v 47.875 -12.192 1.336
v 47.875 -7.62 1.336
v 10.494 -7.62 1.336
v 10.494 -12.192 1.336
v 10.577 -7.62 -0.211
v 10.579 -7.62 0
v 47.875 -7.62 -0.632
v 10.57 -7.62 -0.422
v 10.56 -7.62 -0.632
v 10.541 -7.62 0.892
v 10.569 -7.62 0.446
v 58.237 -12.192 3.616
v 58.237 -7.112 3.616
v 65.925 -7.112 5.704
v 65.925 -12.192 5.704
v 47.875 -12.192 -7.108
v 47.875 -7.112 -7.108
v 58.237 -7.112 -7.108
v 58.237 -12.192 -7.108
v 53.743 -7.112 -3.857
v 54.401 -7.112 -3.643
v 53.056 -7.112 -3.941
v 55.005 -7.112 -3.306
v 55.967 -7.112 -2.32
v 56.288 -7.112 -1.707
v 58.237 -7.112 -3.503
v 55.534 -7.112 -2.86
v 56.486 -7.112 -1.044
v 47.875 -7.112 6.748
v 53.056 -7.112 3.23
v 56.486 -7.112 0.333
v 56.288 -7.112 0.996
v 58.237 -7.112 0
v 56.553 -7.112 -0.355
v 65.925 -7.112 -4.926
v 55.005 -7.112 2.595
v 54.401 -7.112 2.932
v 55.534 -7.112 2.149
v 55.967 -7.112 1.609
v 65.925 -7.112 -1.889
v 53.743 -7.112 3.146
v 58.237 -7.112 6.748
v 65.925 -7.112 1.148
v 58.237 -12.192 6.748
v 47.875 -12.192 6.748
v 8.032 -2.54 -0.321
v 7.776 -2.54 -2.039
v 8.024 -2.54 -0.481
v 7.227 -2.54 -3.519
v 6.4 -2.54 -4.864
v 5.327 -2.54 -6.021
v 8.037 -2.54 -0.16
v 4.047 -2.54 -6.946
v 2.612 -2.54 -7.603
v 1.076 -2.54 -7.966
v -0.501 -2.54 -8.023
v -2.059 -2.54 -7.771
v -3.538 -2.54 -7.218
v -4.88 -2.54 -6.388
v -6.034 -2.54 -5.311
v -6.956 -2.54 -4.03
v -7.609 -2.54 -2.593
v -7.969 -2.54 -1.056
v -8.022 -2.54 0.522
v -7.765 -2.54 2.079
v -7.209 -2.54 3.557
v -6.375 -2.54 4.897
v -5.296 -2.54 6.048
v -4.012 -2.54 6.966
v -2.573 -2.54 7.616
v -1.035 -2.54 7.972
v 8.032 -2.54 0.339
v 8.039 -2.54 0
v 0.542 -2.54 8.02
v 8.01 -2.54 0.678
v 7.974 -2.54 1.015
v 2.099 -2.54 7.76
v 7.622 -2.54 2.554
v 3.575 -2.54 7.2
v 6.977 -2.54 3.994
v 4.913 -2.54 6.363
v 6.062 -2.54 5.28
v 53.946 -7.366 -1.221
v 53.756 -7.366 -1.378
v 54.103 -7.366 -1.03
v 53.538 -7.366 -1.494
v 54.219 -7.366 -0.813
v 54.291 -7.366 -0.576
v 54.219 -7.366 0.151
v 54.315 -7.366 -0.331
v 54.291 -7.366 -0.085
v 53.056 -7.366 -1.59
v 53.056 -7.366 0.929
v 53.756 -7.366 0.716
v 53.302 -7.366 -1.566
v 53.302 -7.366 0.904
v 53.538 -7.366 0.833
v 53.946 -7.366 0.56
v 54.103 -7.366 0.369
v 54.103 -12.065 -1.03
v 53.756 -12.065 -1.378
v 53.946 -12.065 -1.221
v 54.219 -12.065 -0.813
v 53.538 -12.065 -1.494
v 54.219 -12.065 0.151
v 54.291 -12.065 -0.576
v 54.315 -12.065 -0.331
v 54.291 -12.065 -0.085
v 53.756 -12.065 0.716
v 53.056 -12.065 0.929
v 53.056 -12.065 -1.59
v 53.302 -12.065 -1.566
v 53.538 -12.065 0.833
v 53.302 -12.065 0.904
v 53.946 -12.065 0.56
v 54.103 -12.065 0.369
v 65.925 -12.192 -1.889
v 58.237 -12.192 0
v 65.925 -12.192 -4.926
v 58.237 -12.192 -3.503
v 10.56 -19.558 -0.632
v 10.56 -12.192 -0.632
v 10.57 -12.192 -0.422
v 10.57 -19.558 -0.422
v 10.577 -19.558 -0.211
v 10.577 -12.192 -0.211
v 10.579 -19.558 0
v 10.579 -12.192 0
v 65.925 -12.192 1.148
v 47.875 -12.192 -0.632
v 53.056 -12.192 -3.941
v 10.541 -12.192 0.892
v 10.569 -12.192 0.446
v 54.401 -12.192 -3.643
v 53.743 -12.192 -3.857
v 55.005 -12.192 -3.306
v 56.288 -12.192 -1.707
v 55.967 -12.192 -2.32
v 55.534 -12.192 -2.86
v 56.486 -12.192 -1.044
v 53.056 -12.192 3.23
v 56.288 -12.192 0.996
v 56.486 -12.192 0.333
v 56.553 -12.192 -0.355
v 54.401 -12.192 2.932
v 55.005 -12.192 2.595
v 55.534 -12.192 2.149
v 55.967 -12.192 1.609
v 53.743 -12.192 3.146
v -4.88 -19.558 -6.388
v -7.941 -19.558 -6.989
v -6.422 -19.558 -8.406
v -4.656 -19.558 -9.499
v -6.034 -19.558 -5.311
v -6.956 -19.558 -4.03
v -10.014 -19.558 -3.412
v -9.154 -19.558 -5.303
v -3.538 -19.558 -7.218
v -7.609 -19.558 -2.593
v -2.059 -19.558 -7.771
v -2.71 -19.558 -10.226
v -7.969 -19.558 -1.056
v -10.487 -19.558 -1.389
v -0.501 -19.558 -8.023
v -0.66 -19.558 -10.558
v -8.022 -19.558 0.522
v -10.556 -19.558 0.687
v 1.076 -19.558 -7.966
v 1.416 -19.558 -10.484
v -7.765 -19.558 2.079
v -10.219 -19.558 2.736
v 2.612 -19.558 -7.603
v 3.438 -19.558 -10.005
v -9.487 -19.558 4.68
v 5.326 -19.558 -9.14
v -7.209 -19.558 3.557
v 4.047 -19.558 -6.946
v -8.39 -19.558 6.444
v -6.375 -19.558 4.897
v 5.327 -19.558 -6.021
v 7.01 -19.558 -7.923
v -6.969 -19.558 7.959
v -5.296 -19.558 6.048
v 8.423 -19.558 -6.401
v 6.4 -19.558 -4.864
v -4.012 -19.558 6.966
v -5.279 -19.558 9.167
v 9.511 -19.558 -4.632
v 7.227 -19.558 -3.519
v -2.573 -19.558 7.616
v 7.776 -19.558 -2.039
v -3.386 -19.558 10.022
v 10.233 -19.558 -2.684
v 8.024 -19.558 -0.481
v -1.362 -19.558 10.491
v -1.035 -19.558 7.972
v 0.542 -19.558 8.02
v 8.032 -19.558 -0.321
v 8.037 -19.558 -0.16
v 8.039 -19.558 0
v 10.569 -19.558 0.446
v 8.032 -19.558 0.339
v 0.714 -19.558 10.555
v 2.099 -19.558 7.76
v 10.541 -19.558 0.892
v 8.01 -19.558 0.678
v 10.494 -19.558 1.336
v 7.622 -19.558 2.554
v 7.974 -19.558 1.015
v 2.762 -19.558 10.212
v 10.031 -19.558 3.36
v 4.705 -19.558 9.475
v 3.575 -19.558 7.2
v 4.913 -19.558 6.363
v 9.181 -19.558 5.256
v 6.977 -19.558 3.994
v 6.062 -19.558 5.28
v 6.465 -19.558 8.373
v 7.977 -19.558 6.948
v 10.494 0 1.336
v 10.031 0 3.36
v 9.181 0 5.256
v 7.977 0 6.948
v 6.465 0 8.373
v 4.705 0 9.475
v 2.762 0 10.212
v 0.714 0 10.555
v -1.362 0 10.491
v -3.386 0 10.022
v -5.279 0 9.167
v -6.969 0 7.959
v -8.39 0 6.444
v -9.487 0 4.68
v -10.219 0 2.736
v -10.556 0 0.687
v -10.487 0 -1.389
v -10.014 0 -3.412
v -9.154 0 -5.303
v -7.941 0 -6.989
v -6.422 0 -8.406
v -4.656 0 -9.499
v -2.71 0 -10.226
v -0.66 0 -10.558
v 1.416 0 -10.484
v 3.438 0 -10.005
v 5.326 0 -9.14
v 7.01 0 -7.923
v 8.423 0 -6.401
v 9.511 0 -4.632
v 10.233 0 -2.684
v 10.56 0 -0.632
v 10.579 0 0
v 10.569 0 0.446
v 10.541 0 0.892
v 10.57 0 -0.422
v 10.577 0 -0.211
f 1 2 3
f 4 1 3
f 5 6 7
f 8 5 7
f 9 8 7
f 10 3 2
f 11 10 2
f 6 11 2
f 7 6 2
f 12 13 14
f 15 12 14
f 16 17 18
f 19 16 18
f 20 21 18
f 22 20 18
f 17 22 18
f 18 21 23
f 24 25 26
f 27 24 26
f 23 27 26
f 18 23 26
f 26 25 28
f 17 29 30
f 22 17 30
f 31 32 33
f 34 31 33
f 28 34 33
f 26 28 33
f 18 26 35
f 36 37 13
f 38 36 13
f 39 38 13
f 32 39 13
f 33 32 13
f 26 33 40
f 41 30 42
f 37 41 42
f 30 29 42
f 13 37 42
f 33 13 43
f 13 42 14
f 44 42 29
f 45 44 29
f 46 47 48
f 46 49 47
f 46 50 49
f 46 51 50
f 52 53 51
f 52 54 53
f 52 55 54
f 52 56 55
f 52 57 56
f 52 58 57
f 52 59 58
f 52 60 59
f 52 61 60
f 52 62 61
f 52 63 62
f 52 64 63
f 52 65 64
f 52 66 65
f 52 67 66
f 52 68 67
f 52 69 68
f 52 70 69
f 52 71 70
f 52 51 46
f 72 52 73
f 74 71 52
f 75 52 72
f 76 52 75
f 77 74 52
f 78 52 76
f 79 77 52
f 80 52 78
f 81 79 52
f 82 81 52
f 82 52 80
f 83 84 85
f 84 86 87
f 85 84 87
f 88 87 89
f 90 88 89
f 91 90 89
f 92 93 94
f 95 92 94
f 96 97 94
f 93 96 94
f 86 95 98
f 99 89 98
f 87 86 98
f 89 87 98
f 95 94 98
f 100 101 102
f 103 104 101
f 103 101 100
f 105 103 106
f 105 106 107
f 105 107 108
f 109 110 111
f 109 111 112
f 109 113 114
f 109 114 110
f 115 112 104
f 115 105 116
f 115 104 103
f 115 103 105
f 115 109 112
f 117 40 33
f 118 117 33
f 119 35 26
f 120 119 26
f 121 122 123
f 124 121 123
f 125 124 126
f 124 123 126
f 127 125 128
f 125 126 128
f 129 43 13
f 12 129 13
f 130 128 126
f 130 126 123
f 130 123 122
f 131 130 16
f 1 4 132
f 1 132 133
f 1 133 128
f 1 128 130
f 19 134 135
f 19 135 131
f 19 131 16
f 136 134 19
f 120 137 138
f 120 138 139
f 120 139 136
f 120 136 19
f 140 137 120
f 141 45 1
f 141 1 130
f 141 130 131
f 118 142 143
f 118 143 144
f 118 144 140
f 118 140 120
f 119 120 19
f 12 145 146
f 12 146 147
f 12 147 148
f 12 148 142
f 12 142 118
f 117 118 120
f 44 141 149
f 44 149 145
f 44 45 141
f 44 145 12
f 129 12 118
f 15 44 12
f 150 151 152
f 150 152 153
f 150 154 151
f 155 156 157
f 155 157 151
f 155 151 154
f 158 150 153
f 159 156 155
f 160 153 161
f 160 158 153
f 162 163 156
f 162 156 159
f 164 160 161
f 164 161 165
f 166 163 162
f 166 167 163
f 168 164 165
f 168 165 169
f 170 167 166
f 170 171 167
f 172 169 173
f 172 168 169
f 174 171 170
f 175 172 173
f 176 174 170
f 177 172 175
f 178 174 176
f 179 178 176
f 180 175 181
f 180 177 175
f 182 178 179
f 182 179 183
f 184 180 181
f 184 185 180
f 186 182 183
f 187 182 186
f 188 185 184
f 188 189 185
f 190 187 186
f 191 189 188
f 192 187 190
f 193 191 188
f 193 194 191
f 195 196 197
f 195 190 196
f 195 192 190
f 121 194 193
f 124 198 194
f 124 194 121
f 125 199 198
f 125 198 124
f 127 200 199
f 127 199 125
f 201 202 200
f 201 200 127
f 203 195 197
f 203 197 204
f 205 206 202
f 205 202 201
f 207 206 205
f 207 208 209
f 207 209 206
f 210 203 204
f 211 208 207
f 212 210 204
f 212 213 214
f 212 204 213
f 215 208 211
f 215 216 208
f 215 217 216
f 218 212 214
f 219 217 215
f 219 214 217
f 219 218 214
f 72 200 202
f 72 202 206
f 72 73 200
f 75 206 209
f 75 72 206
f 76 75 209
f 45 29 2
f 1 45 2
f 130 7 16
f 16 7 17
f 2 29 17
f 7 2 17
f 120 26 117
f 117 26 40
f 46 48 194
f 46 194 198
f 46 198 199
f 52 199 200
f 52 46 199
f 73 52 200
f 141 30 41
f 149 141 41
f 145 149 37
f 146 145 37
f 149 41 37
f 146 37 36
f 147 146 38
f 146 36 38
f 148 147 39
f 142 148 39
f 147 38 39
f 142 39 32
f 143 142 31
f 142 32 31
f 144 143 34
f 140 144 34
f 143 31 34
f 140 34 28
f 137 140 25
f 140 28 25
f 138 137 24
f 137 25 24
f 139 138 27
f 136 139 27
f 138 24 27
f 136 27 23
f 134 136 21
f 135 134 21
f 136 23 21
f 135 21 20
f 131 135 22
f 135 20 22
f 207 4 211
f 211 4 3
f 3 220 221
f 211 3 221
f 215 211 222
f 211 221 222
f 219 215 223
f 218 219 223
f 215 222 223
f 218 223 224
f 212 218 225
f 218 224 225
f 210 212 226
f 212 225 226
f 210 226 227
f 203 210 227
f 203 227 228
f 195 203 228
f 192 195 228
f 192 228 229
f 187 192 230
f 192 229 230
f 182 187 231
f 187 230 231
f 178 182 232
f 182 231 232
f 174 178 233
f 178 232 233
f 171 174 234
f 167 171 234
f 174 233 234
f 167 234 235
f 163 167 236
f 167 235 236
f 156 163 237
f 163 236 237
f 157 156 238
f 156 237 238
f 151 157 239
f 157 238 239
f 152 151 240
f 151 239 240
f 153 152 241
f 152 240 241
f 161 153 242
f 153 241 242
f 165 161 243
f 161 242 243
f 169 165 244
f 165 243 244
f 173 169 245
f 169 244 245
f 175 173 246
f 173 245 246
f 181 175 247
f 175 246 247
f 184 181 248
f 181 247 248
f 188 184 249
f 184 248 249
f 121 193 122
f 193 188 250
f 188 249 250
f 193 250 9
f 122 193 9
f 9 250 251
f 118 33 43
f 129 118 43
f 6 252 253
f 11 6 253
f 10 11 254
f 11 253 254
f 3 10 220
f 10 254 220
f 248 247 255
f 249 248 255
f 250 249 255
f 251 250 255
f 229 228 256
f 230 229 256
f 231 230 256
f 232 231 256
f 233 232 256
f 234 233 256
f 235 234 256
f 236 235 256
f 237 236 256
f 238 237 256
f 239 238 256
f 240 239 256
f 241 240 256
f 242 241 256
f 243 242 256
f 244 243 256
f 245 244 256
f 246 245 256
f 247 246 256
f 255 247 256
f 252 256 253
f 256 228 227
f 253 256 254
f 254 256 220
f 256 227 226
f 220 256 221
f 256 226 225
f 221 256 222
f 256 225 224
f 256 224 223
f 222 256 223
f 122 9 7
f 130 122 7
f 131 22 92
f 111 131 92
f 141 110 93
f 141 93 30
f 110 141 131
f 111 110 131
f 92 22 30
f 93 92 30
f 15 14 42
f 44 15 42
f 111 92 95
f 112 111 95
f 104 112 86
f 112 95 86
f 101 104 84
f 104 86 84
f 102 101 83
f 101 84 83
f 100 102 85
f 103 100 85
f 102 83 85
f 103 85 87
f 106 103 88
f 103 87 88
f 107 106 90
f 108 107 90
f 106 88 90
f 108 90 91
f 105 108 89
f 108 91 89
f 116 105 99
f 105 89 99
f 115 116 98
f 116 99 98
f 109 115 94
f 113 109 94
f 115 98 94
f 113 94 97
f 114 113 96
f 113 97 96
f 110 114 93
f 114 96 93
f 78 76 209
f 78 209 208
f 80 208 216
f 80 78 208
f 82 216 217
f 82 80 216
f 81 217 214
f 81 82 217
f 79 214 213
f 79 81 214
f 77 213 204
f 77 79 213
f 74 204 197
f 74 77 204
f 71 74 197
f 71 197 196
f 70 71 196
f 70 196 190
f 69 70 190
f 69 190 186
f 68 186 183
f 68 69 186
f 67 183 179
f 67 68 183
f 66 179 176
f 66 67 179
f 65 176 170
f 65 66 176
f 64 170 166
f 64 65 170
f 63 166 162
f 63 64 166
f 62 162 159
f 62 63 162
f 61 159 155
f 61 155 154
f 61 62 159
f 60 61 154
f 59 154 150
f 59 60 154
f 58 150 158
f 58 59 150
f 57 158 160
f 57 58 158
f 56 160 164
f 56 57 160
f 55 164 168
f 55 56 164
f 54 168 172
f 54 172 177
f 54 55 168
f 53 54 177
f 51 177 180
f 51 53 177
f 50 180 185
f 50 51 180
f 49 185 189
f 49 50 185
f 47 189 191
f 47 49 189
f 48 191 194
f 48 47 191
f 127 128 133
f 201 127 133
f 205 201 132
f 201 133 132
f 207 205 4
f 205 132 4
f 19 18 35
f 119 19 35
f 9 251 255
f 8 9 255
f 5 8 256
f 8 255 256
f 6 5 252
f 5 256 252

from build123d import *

# Parameters (mm, degrees)
F1_DEPTH = 19.558
F2_T     = -2.54
F3_START = 7.62
F3_DEPTH = 4.572
F4_START = 7.112
F4_DEPTH = 5.08
F5_START = 7.366
F5_DEPTH = 4.699


with BuildPart() as f1:
    # F0 (on Front) → F1 (new body)
    with BuildSketch(Plane.XZ):
        with BuildLine():
            Line((10.5598789448, -0.6324698916), (10.4941550919, 1.3355786754))
            ThreePointArc((10.4941550919, 1.3355786754), (-10.5729083556, -0.3530869534), (10.5598789448, -0.6324698916))
        make_face()
        with BuildLine():
            ThreePointArc((10.5598789448, -0.6324698916), (10.574070523, -0.3163764621), (10.5788024602, 0))
            ThreePointArc((10.5788024602, 0), (10.5576194096, 0.6691292056), (10.4941550919, 1.3355786754))
            Line((10.4941550919, 1.3355786754), (10.5598789448, -0.6324698916))
        make_face()
    extrude(amount=F1_DEPTH)

    # F2
    f2_openings = [f1.faces().sort_by_distance(p)[0] for p in [
        (0, -19.558, 0),
    ]]
    offset(amount=F2_T, openings=f2_openings)

    # F0 (on Front) → F3 (join)
    with BuildSketch(Plane.XZ.offset(F3_START)):
        with BuildLine():
            ThreePointArc((10.4941550919, 1.3355786754), (10.5576194096, 0.6691292056), (10.5788024602, 0))
            ThreePointArc((10.5788024602, 0), (10.574070523, -0.3163764621), (10.5598789448, -0.6324698916))
            Line((10.5598789448, -0.6324698916), (47.8745400906, -0.6324698916))
            Line((47.8745400906, -0.6324698916), (47.8745400906, 1.3355786754))
            Line((47.8745400906, 1.3355786754), (10.4941550919, 1.3355786754))
        make_face()
    extrude(amount=F3_DEPTH)

    # F0 (on Front) → F4 (join)
    with BuildSketch(Plane.XZ.offset(F4_START)):
        Polygon((47.8745400906, 6.7476513796), (47.8745400906, 1.3355786754), (47.8745400906, -0.6324698916), (47.8745400906, -7.1075903252), (58.2372918725, -7.1075903252), (65.9249648452, -4.9262144603), (58.2372918725, -3.502572421), (65.9249648452, -1.8891115906), (58.2372918725, 0), (65.9249648452, 1.1479911627), (58.2372918725, 3.6156391725), (65.9249648452, 5.7036471553), (58.2372918725, 6.7476513796), align=None)
        with BuildLine():
            ThreePointArc((53.0559159815, 3.2301100822), (56.5529149026, -0.3554173745), (53.0559159815, -3.9409448312))
            Line((53.0559159815, -3.9409448312), (53.0559159815, -1.589890453))
            Line((53.0559159815, -1.589890453), (53.0559159815, 0.9286483983))
            Line((53.0559159815, 0.9286483983), (53.0559159815, 3.2301100822))
        make_face(mode=Mode.SUBTRACT)
    extrude(amount=F4_DEPTH)

    # F0 (on Front) → F5 (join)
    with BuildSketch(Plane.XZ.offset(F5_START)):
        with BuildLine():
            Line((53.0559159815, 0.9286483983), (53.0559159815, -1.589890453))
            ThreePointArc((53.0559159815, -1.589890453), (54.3151854072, -0.3306210274), (53.0559159815, 0.9286483983))
        make_face()
    extrude(amount=F5_DEPTH)


solid = f1.part
